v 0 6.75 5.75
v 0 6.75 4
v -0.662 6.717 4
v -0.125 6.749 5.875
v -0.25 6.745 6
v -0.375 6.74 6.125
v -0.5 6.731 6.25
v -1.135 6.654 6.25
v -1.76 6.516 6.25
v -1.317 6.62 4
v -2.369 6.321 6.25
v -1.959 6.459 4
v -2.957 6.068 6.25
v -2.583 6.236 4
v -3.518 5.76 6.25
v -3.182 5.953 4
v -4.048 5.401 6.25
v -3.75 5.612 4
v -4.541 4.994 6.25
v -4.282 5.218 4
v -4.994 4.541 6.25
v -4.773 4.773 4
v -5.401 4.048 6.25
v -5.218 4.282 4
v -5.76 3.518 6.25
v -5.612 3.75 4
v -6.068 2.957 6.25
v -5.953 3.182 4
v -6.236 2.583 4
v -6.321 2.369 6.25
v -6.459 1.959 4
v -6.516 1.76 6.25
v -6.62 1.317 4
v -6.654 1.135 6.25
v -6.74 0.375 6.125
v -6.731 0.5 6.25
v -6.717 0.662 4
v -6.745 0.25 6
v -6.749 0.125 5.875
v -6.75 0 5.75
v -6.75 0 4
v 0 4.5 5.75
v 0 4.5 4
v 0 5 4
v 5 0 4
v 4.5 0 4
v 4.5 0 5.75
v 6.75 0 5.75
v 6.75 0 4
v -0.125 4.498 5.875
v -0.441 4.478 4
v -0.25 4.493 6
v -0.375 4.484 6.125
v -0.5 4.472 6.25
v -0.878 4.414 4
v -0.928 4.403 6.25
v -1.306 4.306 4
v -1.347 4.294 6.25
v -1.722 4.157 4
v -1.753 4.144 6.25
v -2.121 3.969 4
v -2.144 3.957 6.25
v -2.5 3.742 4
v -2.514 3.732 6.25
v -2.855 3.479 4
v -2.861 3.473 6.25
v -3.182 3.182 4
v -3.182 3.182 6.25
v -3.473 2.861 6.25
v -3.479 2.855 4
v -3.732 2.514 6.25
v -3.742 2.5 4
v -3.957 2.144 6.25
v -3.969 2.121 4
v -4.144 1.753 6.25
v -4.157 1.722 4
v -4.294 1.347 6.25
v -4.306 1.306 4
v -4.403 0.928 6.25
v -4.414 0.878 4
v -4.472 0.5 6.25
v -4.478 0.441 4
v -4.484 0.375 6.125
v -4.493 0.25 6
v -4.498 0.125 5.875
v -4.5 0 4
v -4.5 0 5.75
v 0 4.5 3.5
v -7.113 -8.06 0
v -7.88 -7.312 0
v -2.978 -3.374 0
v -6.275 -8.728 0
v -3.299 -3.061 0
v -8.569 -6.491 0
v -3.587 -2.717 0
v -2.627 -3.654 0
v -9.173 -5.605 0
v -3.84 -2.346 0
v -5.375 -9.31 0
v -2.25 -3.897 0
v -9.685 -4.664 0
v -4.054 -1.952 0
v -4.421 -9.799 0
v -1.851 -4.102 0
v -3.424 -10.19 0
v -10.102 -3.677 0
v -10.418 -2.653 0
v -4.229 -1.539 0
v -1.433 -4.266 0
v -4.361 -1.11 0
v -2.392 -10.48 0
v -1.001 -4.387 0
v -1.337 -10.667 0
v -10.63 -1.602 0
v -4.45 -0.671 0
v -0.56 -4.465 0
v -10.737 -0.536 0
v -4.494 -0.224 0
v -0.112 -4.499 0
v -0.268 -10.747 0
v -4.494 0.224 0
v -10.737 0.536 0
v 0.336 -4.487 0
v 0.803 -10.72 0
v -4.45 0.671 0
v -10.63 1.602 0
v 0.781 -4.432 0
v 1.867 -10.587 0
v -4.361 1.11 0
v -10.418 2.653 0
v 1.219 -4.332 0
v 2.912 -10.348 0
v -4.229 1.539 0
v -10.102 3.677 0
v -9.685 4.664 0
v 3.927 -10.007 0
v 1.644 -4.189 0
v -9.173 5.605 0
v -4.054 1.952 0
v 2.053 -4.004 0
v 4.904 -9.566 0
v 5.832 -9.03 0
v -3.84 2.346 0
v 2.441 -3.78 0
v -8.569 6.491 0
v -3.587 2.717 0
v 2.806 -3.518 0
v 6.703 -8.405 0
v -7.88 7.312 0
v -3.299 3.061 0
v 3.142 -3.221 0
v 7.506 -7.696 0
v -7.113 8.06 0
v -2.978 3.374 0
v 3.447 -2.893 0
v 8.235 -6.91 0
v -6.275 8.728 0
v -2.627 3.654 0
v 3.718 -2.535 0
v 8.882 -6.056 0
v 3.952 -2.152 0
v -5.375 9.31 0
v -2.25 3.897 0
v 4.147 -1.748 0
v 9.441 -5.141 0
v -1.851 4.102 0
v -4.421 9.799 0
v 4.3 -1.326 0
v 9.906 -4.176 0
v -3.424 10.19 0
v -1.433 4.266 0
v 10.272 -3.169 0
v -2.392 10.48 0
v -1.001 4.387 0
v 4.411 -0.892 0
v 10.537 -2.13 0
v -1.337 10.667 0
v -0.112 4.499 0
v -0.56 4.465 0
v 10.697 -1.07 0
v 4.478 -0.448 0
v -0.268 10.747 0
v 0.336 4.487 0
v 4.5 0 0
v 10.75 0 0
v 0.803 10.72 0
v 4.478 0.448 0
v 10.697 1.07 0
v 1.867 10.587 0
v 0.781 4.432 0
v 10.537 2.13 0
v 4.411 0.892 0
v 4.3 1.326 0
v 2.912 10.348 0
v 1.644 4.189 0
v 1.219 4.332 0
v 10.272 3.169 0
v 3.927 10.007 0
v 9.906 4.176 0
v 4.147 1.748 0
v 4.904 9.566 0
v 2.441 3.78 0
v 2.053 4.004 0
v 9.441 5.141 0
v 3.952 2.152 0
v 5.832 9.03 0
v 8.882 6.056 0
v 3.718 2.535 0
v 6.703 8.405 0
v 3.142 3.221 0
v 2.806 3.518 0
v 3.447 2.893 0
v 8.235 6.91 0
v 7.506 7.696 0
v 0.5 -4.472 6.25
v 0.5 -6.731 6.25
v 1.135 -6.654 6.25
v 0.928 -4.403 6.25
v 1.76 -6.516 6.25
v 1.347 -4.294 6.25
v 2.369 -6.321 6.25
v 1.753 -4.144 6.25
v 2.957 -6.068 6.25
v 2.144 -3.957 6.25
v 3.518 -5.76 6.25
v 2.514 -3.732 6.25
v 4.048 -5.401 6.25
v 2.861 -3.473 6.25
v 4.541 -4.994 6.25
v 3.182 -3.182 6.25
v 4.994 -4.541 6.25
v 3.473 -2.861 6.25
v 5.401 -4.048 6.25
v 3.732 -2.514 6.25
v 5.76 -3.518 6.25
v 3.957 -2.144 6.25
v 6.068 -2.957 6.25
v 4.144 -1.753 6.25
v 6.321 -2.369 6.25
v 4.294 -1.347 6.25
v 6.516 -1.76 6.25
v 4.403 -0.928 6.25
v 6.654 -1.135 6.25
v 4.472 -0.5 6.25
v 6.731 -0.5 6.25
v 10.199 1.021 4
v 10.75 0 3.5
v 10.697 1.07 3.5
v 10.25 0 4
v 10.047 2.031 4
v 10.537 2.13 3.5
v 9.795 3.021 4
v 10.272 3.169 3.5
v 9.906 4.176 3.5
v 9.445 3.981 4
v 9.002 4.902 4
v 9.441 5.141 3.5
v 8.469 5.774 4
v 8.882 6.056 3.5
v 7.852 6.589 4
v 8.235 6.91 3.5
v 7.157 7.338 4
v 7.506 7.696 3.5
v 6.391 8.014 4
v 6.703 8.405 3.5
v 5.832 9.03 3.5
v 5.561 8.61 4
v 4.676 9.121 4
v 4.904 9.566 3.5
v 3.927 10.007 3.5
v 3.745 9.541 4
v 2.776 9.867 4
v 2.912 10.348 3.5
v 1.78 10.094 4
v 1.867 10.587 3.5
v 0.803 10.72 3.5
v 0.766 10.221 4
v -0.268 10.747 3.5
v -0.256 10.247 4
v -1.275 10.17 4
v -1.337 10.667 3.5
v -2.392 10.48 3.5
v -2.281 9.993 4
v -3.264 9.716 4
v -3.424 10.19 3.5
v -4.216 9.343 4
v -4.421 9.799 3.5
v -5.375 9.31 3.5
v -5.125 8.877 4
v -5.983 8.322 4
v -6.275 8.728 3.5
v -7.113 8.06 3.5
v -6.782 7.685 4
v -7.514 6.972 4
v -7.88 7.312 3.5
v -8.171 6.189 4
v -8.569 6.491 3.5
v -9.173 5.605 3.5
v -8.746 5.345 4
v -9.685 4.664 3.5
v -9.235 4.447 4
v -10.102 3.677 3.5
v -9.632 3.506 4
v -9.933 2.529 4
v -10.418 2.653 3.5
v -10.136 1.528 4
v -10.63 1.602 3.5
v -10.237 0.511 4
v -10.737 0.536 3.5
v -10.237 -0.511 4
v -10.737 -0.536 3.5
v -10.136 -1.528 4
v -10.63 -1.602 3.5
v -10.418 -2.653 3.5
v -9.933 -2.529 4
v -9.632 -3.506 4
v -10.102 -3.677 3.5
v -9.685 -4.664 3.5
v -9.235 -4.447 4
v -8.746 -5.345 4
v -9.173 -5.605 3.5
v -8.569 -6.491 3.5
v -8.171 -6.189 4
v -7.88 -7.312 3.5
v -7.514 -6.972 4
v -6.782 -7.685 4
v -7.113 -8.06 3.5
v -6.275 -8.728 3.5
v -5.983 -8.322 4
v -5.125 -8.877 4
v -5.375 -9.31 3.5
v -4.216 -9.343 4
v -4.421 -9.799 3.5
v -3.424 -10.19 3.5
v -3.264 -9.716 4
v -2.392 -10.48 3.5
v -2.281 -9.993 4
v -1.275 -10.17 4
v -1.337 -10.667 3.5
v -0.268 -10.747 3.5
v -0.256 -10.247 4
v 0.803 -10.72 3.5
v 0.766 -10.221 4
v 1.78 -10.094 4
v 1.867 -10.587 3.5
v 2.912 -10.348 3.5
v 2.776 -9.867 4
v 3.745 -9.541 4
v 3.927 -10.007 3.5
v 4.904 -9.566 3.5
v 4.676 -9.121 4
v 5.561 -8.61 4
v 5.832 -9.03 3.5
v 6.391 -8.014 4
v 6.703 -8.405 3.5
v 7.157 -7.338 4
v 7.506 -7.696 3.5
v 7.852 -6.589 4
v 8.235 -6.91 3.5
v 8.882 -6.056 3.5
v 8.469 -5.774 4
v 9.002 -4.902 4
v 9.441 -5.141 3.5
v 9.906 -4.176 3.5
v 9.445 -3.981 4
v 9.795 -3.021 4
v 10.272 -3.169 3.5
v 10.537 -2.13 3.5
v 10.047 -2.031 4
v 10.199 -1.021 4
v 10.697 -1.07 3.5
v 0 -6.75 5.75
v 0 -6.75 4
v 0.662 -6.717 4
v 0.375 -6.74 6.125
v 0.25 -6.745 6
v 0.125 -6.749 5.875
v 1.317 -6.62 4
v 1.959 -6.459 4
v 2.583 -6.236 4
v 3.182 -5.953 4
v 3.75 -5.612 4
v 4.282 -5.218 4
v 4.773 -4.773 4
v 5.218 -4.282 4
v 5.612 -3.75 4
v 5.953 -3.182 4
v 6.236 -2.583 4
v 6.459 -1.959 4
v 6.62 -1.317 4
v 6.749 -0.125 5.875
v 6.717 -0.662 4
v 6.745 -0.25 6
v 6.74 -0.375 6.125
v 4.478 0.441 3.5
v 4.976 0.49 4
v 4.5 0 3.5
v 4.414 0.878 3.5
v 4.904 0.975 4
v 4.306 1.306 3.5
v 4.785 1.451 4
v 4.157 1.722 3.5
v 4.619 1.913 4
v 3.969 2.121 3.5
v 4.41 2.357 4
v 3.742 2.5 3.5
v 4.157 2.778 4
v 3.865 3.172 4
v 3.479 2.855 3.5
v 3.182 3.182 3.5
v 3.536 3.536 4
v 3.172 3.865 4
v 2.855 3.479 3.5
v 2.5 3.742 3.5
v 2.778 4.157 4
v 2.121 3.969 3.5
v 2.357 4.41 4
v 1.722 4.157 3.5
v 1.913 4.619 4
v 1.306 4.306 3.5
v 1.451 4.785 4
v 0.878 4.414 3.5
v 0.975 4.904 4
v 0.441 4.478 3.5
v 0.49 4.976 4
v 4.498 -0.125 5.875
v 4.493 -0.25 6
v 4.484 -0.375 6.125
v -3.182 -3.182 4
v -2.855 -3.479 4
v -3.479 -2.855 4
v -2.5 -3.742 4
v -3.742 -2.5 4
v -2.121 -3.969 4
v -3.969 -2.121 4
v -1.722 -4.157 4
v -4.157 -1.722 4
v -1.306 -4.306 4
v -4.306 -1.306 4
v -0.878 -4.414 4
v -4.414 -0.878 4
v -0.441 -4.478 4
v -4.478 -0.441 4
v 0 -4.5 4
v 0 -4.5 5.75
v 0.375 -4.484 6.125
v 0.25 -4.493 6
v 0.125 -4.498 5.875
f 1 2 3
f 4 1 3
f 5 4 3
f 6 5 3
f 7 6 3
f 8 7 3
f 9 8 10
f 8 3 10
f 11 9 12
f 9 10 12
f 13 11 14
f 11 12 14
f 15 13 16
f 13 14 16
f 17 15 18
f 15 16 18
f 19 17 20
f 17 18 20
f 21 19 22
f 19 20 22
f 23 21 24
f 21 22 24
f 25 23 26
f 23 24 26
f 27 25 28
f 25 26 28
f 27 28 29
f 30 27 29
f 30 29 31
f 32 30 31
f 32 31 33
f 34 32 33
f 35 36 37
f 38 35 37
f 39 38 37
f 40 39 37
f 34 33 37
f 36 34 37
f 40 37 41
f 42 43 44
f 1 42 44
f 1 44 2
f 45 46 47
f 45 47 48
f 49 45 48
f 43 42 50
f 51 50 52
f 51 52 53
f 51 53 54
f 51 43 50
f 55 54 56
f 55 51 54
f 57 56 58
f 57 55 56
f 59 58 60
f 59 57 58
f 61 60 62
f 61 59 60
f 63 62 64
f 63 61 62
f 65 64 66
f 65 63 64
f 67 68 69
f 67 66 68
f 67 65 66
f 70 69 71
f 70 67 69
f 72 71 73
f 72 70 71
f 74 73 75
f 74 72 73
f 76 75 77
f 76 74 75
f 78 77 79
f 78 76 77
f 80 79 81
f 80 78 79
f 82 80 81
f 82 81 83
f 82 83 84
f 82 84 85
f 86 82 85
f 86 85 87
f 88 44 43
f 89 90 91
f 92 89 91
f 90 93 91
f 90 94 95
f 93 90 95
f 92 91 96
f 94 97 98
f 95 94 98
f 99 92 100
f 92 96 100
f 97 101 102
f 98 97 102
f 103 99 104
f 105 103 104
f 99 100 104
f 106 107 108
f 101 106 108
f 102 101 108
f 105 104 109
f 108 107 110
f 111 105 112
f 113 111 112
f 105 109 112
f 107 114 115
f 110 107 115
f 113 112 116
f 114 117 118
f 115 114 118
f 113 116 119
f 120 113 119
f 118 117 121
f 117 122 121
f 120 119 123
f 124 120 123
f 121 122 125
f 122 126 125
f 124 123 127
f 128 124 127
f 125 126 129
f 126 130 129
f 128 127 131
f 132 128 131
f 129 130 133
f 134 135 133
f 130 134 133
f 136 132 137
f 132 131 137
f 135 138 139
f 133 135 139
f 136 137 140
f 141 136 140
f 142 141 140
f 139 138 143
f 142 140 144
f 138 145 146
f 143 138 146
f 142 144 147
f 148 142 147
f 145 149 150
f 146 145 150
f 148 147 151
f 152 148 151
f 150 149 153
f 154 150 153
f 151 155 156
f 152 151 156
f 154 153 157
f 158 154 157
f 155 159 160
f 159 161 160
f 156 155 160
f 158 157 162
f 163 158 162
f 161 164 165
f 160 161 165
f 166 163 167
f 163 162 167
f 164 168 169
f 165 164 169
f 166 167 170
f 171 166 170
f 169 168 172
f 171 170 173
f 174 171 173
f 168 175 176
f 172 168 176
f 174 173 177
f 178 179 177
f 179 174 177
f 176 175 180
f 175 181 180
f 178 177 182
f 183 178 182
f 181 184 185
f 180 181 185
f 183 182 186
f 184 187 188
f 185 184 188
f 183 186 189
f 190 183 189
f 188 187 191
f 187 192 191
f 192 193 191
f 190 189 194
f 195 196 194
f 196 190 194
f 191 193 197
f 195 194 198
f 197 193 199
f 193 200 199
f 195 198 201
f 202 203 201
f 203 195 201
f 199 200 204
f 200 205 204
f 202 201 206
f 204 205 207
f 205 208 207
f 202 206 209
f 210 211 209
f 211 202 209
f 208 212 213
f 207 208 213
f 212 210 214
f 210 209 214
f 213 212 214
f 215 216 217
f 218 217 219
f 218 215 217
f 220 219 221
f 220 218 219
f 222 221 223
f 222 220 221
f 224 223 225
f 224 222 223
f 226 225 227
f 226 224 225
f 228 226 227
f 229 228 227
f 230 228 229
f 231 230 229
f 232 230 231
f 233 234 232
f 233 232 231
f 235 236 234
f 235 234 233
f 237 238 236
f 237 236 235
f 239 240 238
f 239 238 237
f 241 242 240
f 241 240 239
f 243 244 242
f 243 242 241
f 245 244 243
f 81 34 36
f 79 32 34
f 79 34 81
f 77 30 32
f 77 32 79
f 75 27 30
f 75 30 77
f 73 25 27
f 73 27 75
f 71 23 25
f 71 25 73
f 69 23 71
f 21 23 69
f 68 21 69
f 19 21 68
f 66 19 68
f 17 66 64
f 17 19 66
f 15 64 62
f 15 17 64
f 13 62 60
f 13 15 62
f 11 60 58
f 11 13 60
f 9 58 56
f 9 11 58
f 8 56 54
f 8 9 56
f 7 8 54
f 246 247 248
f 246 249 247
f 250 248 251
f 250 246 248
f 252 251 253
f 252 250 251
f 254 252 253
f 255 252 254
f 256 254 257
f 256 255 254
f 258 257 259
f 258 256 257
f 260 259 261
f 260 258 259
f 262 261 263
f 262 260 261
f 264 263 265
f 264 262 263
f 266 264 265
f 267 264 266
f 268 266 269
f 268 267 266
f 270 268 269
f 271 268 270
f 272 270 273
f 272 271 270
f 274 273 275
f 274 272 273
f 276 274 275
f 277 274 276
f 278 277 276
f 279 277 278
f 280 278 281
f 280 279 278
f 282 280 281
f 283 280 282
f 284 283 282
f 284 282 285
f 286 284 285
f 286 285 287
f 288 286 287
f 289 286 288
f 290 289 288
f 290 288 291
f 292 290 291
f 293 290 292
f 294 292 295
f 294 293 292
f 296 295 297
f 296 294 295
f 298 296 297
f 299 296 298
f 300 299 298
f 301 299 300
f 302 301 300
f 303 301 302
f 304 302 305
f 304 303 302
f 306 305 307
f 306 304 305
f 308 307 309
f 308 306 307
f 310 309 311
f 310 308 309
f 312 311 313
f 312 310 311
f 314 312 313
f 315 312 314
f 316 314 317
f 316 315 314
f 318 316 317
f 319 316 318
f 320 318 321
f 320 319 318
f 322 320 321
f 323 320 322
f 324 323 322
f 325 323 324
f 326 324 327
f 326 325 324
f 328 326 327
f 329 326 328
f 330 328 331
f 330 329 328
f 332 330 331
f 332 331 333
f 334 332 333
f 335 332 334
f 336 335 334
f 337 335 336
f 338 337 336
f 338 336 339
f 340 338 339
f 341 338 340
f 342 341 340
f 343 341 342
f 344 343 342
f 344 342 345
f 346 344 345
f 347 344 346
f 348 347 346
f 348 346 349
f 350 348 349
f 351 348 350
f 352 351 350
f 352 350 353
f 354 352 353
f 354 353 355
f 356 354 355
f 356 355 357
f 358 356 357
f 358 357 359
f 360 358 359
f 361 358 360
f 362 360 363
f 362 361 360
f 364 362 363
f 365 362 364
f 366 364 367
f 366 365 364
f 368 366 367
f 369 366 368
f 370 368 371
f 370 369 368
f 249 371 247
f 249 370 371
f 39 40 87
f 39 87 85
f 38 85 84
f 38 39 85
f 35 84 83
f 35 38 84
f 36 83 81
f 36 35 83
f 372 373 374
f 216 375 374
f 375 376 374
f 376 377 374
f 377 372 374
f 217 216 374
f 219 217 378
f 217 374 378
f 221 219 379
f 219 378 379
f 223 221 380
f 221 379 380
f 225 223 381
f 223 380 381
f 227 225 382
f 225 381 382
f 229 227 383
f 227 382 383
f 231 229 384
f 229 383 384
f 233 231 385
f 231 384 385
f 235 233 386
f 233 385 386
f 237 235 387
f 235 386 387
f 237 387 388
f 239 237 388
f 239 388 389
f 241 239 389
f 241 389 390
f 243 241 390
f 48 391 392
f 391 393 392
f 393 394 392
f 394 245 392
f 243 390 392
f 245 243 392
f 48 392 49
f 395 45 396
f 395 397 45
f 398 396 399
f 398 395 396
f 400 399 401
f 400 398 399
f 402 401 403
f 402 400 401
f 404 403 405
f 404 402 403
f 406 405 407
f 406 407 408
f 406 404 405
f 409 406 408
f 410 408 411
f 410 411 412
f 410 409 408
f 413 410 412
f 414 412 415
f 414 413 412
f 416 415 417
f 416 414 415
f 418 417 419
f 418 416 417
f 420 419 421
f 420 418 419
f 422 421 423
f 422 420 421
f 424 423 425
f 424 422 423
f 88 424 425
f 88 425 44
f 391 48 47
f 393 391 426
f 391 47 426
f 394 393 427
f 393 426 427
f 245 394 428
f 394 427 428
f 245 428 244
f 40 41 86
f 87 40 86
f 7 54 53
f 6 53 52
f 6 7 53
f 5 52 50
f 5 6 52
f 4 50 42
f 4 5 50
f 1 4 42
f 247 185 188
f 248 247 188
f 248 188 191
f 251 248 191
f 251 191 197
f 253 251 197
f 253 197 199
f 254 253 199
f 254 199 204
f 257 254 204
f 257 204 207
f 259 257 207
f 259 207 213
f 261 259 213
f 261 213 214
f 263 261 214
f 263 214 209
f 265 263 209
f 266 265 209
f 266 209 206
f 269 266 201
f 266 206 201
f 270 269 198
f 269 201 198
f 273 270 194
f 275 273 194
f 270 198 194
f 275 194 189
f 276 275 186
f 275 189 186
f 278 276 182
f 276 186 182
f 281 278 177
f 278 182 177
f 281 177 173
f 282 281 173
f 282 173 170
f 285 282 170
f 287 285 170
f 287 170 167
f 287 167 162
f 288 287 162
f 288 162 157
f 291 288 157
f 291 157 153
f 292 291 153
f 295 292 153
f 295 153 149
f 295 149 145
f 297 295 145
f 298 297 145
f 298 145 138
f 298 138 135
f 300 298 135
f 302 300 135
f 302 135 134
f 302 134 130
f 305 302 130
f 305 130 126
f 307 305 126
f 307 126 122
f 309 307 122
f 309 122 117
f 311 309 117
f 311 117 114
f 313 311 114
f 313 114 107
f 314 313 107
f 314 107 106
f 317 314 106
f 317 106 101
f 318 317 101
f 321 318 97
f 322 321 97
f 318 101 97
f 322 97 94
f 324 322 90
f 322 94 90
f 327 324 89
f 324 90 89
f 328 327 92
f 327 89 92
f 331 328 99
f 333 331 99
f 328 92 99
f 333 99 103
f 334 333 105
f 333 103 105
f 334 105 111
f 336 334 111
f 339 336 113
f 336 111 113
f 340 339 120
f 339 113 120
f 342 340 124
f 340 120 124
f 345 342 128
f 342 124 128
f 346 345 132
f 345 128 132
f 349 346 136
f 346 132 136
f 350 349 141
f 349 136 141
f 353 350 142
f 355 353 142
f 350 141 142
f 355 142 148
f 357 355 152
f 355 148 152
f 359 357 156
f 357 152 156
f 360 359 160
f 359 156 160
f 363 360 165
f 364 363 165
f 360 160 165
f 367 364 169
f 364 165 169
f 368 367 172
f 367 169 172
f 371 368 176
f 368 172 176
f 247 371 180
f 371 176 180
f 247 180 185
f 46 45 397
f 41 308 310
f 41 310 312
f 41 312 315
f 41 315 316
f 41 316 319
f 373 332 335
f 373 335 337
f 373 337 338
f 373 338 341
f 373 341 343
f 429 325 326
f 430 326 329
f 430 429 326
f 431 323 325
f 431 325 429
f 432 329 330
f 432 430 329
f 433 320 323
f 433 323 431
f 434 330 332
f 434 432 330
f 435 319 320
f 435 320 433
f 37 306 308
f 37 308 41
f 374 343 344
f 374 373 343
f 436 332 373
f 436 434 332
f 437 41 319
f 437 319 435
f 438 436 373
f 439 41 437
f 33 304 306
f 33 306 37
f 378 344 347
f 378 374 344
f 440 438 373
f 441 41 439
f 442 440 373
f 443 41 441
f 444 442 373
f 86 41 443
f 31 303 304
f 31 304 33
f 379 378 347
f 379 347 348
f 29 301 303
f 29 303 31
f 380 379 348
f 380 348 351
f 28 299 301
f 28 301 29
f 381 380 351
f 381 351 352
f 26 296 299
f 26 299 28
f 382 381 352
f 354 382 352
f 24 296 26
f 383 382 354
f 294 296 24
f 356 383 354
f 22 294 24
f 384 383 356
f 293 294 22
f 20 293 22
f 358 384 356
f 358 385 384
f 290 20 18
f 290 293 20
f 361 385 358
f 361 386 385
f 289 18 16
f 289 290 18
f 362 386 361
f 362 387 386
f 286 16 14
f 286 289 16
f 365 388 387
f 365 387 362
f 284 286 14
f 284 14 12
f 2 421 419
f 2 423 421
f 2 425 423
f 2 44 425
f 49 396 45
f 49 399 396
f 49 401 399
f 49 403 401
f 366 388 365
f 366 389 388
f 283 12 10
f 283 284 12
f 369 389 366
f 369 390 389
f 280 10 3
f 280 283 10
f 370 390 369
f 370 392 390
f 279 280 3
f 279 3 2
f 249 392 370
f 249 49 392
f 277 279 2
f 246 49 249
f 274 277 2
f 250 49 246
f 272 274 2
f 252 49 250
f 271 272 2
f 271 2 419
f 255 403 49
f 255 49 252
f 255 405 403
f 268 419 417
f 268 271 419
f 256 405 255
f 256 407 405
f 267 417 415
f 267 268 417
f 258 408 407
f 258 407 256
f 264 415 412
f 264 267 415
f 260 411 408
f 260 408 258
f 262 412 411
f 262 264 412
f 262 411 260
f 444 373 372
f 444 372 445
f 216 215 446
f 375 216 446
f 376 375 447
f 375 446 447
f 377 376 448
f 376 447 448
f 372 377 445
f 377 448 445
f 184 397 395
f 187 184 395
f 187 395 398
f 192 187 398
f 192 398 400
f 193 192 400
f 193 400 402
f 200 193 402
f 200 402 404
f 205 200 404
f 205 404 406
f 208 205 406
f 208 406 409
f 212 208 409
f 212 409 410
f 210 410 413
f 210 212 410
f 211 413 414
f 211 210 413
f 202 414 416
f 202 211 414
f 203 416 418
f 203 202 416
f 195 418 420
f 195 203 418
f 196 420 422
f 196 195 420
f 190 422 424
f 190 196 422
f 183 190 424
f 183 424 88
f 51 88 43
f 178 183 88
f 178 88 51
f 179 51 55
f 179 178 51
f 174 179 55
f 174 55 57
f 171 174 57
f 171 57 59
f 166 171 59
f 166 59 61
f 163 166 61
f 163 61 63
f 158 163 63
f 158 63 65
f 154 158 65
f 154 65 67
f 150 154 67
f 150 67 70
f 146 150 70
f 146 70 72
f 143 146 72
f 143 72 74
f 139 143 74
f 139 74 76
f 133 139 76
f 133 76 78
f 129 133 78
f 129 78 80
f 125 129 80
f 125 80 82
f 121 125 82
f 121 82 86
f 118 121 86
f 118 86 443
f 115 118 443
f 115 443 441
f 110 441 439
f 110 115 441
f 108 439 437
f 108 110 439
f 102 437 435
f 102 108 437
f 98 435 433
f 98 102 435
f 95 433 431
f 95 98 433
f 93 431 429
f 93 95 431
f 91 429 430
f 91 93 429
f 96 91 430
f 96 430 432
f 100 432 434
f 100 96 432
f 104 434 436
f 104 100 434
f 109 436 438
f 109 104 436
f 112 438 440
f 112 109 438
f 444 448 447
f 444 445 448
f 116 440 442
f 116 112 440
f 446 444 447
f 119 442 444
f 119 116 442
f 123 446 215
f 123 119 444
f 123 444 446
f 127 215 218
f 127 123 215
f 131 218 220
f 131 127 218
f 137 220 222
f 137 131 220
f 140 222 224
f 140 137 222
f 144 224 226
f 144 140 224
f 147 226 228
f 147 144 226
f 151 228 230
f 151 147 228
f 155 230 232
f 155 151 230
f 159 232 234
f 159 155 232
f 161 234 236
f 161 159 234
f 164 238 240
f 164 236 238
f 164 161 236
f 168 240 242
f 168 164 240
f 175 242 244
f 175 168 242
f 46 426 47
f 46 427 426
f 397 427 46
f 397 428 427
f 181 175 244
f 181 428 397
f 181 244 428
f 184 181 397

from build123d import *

# Parameters (mm, degrees)
F0_R         = 10.75
F0_R_2       = 4.5
F1_DEPTH     = 4
F2_R         = 6.75
F2_R_2       = 4.5
F3_DEPTH     = 6.25
F4_W         = 12
F4_H         = 12
F5_DEPTH     = 10
F8_T1_DEPTH  = 4.821682988
F8_T3_DEPTH  = 4.821682988
F8_T5_DEPTH  = 4.821682988
F8_T7_DEPTH  = 4.821682988
F8_T12_ANGLE = 90


# Not quite as in the source:
# - a fillet or chamfer that OpenCascade refuses, or shapes differently, is made with other operations: its cross-section is extruded or revolved along the edge and cut away or added


with BuildPart() as f1:
    # F0 (on Top) → F1 (new body)
    with BuildSketch(Plane.XY):
        Circle(F0_R)
        Circle(F0_R_2, mode=Mode.SUBTRACT)
    extrude(amount=F1_DEPTH)


with BuildPart() as f3:
    # F2 (on Top) → F3 (new body)
    with BuildSketch(Plane.XY):
        Circle(F2_R)
        Circle(F2_R_2, mode=Mode.SUBTRACT)
    extrude(amount=F3_DEPTH)


with BuildPart() as f5:
    # F4 (on Top) → F5 (new body)
    with BuildSketch(Plane.XY):
        with Locations((6, 6)):
            Rectangle(F4_W, F4_H)
    extrude(amount=F5_DEPTH)


with BuildPart() as f5b:
    # F4 (on Top) → F5, piece 2 (new body)
    with BuildSketch(Plane.XY):
        with Locations((-6, -6)):
            Rectangle(F4_W, F4_H)
    extrude(amount=F5_DEPTH)


with BuildPart() as f3_1:
    add(f3.part)

    # F6: cut F5b, F5
    add(f5b.part, mode=Mode.SUBTRACT)
    add(f5.part, mode=Mode.SUBTRACT)


with BuildPart() as f1_1:
    add(f1.part)

    # F7: union F3
    add(f3_1.part)

    # F8: chamfer of 0.5 on 6 edges, made by hand

    # F8_s2 → F8_t1 (cut)
    with BuildSketch(Plane.YZ.offset(-8.035841494)):
        Polygon((0, 5.75), (0.5, 6.25), (0, 6.25), align=None)
    extrude(amount=F8_T1_DEPTH, mode=Mode.SUBTRACT)

    # F8_s4 → F8_t3 (cut)
    with BuildSketch(Plane.XZ.offset(-8.035841494)):
        Polygon((-0.5, 6.25), (0, 5.75), (0, 6.25), align=None)
    extrude(amount=F8_T3_DEPTH, mode=Mode.SUBTRACT)

    # F8_s6 → F8_t5 (cut)
    with BuildSketch(Plane.XZ.offset(3.214158506)):
        Polygon((0.5, 6.25), (0, 5.75), (0, 6.25), align=None)
    extrude(amount=F8_T5_DEPTH, mode=Mode.SUBTRACT)

    # F8_s8 → F8_t7 (cut)
    with BuildSketch(Plane.YZ.offset(3.214158506)):
        Polygon((0, 5.75), (-0.5, 6.25), (0, 6.25), align=None)
    extrude(amount=F8_T7_DEPTH, mode=Mode.SUBTRACT)

    # F8_s9 → F8_t10 (revolve, cut)
    with BuildSketch(Plane.XZ):
        Polygon((10.75, 3.5), (10.25, 4), (10.75, 4), align=None)
    revolve(axis=Axis((0, 0, 4), (0, 0, 1)), mode=Mode.SUBTRACT)

    # F8_s11 → F8_t12 (revolve, cut)
    with BuildSketch(Plane.XZ):
        Polygon((5, 4), (4.5, 3.5), (4.5, 4), align=None)
    revolve(axis=Axis((0, 0, 4), (0, 0, 1)), revolution_arc=F8_T12_ANGLE, mode=Mode.SUBTRACT)


solid = f1_1.part
